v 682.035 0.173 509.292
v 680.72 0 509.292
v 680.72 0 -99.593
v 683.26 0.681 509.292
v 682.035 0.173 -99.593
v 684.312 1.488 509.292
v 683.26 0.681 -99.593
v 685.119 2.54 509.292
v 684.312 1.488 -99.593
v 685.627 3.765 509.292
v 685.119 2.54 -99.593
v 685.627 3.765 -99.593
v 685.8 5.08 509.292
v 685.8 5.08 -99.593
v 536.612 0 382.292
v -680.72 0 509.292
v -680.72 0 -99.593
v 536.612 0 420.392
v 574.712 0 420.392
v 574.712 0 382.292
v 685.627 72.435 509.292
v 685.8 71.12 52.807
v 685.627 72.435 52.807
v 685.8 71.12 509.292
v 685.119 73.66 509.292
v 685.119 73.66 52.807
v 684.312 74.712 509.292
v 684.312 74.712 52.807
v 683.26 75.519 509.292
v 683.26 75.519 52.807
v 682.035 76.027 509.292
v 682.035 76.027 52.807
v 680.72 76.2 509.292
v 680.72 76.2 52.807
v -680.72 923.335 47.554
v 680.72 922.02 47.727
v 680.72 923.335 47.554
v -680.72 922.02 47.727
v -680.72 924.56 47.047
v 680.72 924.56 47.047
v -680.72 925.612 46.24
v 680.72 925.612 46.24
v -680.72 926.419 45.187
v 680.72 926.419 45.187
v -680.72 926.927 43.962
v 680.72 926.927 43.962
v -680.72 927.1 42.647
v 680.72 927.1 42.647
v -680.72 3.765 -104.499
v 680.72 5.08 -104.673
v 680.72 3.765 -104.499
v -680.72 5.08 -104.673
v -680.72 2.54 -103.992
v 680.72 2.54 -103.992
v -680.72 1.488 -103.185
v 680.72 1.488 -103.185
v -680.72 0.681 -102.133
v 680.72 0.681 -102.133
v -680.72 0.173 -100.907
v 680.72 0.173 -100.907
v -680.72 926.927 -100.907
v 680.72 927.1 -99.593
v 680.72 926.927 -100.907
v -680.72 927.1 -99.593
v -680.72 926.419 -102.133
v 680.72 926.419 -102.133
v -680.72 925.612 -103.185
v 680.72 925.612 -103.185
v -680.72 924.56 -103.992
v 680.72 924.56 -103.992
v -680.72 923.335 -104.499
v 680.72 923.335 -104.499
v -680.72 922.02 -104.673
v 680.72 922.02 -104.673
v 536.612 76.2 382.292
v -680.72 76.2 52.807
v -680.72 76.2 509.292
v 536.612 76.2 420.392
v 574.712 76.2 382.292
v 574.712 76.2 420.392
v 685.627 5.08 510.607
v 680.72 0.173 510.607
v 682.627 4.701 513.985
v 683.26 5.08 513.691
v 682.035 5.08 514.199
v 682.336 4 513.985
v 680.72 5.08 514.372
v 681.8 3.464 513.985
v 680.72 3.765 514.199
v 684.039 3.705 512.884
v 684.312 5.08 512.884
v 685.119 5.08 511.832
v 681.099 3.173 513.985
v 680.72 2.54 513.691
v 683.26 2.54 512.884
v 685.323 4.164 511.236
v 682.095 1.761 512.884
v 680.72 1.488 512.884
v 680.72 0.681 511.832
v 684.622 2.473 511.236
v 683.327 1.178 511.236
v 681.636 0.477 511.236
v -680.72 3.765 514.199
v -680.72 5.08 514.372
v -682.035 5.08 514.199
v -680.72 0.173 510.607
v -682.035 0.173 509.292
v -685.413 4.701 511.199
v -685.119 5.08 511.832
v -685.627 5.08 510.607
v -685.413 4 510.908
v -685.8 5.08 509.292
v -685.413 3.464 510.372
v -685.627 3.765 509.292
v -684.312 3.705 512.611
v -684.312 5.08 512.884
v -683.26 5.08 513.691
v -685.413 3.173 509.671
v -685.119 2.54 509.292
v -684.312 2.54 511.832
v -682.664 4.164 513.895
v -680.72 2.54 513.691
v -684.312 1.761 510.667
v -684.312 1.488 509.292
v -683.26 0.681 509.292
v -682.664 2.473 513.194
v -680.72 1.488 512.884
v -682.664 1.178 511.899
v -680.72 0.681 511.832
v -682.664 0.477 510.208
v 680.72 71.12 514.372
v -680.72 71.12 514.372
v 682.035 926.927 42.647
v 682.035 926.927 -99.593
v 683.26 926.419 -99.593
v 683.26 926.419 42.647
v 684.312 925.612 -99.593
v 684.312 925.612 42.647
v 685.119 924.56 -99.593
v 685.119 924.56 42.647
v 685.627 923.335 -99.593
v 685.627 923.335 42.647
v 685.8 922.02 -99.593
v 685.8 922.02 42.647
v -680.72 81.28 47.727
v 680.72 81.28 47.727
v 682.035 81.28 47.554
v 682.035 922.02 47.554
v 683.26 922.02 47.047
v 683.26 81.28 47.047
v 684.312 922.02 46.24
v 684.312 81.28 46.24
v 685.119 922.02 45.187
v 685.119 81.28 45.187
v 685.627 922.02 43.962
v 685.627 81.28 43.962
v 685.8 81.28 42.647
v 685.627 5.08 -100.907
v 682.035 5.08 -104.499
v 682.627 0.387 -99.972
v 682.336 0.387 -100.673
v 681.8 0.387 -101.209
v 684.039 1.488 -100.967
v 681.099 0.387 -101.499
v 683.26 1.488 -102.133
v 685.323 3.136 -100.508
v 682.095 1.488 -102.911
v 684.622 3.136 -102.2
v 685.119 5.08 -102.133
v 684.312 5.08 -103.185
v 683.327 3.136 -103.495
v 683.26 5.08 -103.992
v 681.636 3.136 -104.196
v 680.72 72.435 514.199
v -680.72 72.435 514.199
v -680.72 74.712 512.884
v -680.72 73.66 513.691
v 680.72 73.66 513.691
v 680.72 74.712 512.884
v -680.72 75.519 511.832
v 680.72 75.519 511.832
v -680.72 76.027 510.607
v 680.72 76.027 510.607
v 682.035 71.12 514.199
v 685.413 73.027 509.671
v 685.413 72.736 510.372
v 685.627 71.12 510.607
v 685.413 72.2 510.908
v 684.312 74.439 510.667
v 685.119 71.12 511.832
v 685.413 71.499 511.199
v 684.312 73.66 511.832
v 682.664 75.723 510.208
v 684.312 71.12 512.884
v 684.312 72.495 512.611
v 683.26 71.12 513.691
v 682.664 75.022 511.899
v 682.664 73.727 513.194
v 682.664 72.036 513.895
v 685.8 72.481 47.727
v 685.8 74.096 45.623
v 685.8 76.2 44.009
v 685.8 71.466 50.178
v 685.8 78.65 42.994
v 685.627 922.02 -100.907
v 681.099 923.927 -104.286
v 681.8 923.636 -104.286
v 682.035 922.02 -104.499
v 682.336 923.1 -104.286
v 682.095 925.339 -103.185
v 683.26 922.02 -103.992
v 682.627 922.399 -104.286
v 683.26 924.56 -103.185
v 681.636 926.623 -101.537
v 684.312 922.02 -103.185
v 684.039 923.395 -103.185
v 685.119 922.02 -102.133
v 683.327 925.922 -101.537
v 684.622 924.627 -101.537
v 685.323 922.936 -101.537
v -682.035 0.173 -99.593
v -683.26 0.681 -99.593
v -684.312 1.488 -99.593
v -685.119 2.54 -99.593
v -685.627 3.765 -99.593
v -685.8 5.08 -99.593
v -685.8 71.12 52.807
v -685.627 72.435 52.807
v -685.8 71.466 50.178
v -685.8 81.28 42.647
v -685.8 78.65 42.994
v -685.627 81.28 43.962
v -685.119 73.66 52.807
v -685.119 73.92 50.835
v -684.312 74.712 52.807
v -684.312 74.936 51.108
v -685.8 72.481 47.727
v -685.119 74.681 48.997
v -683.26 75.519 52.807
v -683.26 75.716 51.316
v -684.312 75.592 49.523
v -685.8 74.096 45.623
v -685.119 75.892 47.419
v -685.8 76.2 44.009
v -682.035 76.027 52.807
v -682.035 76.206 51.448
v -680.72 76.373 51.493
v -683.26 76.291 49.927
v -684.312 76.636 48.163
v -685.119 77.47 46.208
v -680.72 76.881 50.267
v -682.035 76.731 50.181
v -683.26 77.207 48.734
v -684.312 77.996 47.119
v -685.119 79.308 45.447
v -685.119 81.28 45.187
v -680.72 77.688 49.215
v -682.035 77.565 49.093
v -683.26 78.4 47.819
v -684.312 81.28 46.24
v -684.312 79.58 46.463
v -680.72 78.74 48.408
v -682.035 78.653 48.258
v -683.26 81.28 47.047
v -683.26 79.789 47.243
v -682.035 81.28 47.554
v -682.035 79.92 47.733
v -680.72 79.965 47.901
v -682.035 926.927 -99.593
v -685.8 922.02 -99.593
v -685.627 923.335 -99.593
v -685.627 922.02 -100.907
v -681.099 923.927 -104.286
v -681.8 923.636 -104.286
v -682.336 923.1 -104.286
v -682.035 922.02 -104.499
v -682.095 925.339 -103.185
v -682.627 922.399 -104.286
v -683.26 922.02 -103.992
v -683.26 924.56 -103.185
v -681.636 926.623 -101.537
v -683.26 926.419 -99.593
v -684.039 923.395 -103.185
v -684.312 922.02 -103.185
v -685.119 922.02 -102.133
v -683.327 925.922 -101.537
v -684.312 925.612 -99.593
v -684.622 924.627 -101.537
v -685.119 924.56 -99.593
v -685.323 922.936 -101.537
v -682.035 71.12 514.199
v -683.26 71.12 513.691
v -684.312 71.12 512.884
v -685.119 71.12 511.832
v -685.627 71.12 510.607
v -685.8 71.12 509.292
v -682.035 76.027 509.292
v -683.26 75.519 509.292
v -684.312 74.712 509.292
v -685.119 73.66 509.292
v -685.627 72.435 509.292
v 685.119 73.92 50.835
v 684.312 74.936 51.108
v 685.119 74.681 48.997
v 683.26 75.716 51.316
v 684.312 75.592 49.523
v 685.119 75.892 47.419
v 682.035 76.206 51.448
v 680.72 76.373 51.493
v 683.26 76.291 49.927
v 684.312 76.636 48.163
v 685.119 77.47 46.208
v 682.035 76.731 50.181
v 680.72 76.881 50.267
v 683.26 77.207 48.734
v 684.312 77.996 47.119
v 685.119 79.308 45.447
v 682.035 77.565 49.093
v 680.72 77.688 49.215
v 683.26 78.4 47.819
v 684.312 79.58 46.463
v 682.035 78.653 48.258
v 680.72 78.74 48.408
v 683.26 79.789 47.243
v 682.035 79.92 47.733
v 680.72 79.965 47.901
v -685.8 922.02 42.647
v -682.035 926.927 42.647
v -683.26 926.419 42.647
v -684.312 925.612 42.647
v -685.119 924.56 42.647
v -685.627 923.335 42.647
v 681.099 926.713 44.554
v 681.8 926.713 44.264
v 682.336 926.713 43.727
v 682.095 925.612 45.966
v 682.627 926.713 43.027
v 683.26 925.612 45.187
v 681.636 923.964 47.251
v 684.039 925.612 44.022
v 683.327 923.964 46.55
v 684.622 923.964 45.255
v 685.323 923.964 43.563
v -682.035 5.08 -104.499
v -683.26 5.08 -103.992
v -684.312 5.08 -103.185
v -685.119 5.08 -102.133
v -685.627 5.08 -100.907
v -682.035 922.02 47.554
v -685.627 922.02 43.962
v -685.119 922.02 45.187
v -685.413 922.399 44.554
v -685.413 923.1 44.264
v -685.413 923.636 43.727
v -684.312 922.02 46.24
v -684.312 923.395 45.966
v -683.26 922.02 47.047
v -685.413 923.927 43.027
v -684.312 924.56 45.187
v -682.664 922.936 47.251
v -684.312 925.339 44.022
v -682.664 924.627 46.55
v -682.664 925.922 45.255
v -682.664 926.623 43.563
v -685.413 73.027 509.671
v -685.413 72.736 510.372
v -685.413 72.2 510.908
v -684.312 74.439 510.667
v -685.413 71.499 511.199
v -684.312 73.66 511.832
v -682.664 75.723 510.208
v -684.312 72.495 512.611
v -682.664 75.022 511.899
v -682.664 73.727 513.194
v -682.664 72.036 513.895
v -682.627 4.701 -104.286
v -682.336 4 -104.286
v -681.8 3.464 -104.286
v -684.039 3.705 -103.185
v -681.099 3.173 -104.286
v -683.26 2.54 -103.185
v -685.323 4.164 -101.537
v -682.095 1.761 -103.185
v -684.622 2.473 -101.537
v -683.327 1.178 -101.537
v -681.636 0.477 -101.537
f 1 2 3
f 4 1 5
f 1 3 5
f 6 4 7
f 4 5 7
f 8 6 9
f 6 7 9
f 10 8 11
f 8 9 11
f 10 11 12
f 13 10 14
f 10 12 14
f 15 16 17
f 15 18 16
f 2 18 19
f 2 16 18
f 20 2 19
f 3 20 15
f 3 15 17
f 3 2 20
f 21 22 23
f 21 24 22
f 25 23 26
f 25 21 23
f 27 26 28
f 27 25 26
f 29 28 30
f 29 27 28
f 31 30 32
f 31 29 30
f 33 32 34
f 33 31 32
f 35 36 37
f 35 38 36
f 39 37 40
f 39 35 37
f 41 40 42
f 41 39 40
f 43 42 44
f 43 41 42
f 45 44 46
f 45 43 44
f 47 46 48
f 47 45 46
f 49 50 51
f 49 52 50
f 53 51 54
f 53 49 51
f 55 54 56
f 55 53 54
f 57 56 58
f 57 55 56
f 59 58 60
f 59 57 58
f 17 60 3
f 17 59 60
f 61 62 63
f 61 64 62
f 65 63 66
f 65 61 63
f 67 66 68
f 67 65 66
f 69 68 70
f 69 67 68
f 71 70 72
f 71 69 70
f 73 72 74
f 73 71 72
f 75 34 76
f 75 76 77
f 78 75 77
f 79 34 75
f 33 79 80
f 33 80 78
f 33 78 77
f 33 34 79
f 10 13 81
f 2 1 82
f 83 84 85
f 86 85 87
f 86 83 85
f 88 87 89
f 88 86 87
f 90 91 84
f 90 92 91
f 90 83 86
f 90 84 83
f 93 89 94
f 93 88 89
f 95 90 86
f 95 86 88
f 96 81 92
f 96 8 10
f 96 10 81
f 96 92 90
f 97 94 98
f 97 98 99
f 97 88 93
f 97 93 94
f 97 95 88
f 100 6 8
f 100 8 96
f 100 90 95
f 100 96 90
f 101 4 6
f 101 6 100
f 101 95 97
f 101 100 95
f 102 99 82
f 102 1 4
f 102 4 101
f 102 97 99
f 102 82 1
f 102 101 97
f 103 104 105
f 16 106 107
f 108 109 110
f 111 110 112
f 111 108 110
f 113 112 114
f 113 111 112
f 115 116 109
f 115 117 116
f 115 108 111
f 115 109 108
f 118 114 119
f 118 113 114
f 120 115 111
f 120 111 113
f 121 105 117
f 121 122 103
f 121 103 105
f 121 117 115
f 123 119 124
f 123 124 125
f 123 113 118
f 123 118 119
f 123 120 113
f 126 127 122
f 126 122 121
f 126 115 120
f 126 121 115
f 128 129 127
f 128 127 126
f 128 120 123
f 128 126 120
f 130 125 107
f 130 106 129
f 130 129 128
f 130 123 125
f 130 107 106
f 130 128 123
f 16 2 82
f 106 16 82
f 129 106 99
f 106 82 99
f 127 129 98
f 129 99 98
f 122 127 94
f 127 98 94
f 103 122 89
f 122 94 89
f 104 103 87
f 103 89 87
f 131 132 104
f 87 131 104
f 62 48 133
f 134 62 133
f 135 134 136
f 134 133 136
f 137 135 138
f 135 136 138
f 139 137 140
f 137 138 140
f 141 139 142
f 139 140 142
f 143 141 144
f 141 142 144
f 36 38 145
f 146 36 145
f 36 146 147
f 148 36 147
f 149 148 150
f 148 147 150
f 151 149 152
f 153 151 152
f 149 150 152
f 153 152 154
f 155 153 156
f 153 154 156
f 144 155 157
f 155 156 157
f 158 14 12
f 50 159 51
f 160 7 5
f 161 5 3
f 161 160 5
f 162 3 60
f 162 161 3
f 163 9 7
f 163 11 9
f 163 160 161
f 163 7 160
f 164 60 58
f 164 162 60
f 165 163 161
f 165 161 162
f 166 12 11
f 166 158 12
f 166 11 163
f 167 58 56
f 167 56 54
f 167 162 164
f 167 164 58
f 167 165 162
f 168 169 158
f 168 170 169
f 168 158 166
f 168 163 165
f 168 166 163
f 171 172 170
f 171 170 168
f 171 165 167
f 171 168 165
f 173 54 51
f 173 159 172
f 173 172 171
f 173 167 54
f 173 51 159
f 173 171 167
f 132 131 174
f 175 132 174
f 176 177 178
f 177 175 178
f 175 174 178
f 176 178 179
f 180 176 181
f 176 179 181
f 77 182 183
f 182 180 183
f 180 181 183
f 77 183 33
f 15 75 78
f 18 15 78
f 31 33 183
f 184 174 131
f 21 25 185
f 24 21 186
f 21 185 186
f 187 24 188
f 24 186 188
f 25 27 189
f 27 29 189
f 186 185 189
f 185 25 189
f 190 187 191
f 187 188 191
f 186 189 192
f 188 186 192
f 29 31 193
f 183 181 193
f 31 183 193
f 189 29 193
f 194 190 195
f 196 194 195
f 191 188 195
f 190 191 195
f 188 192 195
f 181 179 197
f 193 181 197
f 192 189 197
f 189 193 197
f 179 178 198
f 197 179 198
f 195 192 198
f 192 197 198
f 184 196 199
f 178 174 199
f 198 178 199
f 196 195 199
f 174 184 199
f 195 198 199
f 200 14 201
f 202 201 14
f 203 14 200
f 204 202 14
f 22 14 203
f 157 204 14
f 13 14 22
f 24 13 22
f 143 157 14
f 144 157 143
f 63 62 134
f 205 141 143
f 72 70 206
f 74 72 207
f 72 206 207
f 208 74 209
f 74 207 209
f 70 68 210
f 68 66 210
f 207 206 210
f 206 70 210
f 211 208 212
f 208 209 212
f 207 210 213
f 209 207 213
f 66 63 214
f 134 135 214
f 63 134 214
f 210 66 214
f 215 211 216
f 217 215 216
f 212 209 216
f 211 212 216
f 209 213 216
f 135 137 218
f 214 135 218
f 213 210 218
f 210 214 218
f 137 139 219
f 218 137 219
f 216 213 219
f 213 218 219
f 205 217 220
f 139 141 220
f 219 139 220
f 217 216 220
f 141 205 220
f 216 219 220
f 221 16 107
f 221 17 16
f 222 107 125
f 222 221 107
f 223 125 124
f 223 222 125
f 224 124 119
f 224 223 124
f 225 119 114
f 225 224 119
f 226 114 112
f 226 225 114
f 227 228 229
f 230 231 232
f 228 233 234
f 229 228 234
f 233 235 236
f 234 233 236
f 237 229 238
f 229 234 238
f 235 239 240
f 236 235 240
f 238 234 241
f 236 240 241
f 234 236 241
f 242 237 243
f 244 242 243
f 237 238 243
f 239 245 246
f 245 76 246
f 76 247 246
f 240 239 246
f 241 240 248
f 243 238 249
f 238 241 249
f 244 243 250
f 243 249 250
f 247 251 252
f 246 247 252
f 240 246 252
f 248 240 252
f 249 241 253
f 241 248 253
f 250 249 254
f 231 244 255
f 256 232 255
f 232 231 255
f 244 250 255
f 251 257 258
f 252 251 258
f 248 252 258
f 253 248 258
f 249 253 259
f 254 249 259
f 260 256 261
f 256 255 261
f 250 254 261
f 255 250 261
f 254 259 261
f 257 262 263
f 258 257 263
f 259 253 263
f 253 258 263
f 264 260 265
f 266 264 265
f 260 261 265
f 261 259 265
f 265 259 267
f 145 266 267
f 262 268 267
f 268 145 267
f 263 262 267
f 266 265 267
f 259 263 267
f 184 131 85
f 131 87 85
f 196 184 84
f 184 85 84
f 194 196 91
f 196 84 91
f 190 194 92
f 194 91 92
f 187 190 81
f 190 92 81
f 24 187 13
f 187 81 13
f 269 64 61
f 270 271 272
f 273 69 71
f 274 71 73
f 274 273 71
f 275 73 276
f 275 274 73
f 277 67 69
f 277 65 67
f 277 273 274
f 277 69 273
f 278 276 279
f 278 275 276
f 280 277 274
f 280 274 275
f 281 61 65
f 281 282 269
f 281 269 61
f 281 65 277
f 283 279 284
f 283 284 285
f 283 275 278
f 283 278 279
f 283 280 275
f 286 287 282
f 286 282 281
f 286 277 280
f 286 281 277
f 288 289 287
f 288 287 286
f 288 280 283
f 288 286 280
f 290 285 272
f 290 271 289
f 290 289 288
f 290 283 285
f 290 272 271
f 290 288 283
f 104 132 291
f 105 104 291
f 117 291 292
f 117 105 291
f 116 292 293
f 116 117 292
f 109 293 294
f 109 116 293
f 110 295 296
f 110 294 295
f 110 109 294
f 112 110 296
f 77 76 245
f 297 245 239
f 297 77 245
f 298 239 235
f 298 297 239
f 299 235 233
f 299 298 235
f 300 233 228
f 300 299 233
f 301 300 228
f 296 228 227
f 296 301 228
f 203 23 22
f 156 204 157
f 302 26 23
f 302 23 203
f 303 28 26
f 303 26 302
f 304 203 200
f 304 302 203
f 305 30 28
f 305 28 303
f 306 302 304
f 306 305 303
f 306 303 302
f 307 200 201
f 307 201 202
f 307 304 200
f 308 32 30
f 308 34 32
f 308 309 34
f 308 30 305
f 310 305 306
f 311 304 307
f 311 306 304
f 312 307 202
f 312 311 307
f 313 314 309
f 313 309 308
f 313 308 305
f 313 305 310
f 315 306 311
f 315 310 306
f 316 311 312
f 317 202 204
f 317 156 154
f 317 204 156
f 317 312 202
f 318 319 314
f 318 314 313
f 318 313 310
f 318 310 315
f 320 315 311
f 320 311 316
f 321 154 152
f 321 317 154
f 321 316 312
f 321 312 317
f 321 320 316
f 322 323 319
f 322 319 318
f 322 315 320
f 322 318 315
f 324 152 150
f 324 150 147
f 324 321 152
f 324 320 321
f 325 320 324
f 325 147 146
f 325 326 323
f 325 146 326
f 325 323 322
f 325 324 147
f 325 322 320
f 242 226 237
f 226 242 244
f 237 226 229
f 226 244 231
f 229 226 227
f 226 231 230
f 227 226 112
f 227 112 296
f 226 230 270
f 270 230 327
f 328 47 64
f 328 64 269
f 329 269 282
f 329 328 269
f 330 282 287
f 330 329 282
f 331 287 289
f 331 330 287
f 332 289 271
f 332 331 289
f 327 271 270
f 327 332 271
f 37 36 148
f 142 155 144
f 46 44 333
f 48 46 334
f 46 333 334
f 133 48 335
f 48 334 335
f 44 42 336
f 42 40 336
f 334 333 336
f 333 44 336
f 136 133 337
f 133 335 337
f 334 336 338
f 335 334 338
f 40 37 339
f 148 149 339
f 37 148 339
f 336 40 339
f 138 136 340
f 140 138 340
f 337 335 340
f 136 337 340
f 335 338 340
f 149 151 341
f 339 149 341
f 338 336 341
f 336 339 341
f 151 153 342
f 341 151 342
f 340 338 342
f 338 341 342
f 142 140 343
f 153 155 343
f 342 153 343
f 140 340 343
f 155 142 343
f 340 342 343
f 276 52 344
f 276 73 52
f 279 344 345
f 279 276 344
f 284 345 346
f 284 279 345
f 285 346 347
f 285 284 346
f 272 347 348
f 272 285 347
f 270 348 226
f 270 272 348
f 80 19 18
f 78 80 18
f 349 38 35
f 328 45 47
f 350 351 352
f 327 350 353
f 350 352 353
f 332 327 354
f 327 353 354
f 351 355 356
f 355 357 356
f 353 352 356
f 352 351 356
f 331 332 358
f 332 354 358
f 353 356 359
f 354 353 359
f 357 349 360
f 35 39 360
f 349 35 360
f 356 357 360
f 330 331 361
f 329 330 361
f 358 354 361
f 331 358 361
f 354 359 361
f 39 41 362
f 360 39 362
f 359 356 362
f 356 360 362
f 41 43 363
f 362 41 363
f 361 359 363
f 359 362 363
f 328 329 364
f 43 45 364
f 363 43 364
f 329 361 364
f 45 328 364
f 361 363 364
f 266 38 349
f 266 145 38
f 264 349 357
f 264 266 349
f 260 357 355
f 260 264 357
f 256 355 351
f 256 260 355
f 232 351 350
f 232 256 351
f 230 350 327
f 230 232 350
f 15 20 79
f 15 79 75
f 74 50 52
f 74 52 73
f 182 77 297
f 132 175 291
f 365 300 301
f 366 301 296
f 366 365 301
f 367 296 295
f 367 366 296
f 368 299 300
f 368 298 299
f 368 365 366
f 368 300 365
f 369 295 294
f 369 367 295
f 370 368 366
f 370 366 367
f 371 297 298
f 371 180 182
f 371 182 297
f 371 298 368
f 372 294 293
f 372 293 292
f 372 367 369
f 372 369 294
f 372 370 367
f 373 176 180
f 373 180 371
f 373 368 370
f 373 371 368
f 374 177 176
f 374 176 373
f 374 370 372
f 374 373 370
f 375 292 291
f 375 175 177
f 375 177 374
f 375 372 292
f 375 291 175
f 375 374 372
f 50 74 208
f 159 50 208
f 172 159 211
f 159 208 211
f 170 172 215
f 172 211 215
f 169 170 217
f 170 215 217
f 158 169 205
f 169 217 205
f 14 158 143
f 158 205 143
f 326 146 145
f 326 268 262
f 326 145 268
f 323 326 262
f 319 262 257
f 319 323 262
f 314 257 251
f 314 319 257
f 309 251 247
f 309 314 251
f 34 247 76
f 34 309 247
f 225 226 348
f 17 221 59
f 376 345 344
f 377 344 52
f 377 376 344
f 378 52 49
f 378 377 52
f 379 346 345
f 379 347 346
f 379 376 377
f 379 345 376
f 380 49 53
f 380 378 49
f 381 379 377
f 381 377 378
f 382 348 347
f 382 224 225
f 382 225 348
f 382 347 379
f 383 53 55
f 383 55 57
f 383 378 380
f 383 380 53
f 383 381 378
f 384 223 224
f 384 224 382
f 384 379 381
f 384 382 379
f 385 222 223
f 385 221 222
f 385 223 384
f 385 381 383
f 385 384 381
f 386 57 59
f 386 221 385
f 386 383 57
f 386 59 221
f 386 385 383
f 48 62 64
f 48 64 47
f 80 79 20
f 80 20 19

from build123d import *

# Parameters (mm, degrees)
F1_DEPTH   = 685.8
F2_R       = 5.08
F3_W       = 38.1
F3_H       = 38.1
F1_FACE1_W = 1361.44
F1_FACE1_H = 608.8846015944
F4_DEPTH   = 76.201


with BuildPart() as f1:
    # F0 (on Right) → F1 (new body, symmetric)
    with BuildSketch(Plane.YZ):
        Polygon((927.1, 47.7274174528), (76.2, 47.7274174528), (76.2, 514.3720190472), (0, 514.3720190472), (0, -104.6725825472), (76.2, -104.6725825472), (927.1, -104.6725825472), align=None)
    extrude(amount=F1_DEPTH, both=True)

    # F2
    f2_edges = [f1.edges().sort_by_distance(p)[0] for p in [
        (0, 76.2, 514.372019),
        (685.8, 76.2, 281.049718),
        (-685.8, 76.2, 281.049718),
        (685.8, 501.65, 47.727417),
        (0, 927.1, 47.727417),
        (-685.8, 501.65, 47.727417),
        (0, 76.2, 47.727417),
        (685.8, 927.1, -28.472583),
        (-685.8, 927.1, -28.472583),
        (0, 927.1, -104.672583),
        (685.8, 463.55, -104.672583),
        (685.8, 0, 204.849718),
        (685.8, 38.1, 514.372019),
        (0, 0, 514.372019),
        (-685.8, 38.1, 514.372019),
        (-685.8, 0, 204.849718),
        (-685.8, 463.55, -104.672583),
        (0, 0, -104.672583),
    ]]
    fillet(f2_edges, radius=F2_R)

    # F3 (on face) + F1_face1 (on face) → F4 (cut, through all)
    with BuildSketch(Plane(origin=(0, 76.2, 0), x_dir=(-1, 0, 0), z_dir=(0, 1, 0))):
        with Locations((-555.6620976448, 401.3420190472)):
            Rectangle(F3_W, F3_H)
    with BuildSketch(Plane(origin=(0, 0, 204.84971825), x_dir=(1, 0, 0), z_dir=(0, -1, 0))):
        Rectangle(F1_FACE1_W, F1_FACE1_H)
    extrude(amount=-F4_DEPTH, dir=(0, 1, 0), mode=Mode.SUBTRACT)


solid = f1.part
